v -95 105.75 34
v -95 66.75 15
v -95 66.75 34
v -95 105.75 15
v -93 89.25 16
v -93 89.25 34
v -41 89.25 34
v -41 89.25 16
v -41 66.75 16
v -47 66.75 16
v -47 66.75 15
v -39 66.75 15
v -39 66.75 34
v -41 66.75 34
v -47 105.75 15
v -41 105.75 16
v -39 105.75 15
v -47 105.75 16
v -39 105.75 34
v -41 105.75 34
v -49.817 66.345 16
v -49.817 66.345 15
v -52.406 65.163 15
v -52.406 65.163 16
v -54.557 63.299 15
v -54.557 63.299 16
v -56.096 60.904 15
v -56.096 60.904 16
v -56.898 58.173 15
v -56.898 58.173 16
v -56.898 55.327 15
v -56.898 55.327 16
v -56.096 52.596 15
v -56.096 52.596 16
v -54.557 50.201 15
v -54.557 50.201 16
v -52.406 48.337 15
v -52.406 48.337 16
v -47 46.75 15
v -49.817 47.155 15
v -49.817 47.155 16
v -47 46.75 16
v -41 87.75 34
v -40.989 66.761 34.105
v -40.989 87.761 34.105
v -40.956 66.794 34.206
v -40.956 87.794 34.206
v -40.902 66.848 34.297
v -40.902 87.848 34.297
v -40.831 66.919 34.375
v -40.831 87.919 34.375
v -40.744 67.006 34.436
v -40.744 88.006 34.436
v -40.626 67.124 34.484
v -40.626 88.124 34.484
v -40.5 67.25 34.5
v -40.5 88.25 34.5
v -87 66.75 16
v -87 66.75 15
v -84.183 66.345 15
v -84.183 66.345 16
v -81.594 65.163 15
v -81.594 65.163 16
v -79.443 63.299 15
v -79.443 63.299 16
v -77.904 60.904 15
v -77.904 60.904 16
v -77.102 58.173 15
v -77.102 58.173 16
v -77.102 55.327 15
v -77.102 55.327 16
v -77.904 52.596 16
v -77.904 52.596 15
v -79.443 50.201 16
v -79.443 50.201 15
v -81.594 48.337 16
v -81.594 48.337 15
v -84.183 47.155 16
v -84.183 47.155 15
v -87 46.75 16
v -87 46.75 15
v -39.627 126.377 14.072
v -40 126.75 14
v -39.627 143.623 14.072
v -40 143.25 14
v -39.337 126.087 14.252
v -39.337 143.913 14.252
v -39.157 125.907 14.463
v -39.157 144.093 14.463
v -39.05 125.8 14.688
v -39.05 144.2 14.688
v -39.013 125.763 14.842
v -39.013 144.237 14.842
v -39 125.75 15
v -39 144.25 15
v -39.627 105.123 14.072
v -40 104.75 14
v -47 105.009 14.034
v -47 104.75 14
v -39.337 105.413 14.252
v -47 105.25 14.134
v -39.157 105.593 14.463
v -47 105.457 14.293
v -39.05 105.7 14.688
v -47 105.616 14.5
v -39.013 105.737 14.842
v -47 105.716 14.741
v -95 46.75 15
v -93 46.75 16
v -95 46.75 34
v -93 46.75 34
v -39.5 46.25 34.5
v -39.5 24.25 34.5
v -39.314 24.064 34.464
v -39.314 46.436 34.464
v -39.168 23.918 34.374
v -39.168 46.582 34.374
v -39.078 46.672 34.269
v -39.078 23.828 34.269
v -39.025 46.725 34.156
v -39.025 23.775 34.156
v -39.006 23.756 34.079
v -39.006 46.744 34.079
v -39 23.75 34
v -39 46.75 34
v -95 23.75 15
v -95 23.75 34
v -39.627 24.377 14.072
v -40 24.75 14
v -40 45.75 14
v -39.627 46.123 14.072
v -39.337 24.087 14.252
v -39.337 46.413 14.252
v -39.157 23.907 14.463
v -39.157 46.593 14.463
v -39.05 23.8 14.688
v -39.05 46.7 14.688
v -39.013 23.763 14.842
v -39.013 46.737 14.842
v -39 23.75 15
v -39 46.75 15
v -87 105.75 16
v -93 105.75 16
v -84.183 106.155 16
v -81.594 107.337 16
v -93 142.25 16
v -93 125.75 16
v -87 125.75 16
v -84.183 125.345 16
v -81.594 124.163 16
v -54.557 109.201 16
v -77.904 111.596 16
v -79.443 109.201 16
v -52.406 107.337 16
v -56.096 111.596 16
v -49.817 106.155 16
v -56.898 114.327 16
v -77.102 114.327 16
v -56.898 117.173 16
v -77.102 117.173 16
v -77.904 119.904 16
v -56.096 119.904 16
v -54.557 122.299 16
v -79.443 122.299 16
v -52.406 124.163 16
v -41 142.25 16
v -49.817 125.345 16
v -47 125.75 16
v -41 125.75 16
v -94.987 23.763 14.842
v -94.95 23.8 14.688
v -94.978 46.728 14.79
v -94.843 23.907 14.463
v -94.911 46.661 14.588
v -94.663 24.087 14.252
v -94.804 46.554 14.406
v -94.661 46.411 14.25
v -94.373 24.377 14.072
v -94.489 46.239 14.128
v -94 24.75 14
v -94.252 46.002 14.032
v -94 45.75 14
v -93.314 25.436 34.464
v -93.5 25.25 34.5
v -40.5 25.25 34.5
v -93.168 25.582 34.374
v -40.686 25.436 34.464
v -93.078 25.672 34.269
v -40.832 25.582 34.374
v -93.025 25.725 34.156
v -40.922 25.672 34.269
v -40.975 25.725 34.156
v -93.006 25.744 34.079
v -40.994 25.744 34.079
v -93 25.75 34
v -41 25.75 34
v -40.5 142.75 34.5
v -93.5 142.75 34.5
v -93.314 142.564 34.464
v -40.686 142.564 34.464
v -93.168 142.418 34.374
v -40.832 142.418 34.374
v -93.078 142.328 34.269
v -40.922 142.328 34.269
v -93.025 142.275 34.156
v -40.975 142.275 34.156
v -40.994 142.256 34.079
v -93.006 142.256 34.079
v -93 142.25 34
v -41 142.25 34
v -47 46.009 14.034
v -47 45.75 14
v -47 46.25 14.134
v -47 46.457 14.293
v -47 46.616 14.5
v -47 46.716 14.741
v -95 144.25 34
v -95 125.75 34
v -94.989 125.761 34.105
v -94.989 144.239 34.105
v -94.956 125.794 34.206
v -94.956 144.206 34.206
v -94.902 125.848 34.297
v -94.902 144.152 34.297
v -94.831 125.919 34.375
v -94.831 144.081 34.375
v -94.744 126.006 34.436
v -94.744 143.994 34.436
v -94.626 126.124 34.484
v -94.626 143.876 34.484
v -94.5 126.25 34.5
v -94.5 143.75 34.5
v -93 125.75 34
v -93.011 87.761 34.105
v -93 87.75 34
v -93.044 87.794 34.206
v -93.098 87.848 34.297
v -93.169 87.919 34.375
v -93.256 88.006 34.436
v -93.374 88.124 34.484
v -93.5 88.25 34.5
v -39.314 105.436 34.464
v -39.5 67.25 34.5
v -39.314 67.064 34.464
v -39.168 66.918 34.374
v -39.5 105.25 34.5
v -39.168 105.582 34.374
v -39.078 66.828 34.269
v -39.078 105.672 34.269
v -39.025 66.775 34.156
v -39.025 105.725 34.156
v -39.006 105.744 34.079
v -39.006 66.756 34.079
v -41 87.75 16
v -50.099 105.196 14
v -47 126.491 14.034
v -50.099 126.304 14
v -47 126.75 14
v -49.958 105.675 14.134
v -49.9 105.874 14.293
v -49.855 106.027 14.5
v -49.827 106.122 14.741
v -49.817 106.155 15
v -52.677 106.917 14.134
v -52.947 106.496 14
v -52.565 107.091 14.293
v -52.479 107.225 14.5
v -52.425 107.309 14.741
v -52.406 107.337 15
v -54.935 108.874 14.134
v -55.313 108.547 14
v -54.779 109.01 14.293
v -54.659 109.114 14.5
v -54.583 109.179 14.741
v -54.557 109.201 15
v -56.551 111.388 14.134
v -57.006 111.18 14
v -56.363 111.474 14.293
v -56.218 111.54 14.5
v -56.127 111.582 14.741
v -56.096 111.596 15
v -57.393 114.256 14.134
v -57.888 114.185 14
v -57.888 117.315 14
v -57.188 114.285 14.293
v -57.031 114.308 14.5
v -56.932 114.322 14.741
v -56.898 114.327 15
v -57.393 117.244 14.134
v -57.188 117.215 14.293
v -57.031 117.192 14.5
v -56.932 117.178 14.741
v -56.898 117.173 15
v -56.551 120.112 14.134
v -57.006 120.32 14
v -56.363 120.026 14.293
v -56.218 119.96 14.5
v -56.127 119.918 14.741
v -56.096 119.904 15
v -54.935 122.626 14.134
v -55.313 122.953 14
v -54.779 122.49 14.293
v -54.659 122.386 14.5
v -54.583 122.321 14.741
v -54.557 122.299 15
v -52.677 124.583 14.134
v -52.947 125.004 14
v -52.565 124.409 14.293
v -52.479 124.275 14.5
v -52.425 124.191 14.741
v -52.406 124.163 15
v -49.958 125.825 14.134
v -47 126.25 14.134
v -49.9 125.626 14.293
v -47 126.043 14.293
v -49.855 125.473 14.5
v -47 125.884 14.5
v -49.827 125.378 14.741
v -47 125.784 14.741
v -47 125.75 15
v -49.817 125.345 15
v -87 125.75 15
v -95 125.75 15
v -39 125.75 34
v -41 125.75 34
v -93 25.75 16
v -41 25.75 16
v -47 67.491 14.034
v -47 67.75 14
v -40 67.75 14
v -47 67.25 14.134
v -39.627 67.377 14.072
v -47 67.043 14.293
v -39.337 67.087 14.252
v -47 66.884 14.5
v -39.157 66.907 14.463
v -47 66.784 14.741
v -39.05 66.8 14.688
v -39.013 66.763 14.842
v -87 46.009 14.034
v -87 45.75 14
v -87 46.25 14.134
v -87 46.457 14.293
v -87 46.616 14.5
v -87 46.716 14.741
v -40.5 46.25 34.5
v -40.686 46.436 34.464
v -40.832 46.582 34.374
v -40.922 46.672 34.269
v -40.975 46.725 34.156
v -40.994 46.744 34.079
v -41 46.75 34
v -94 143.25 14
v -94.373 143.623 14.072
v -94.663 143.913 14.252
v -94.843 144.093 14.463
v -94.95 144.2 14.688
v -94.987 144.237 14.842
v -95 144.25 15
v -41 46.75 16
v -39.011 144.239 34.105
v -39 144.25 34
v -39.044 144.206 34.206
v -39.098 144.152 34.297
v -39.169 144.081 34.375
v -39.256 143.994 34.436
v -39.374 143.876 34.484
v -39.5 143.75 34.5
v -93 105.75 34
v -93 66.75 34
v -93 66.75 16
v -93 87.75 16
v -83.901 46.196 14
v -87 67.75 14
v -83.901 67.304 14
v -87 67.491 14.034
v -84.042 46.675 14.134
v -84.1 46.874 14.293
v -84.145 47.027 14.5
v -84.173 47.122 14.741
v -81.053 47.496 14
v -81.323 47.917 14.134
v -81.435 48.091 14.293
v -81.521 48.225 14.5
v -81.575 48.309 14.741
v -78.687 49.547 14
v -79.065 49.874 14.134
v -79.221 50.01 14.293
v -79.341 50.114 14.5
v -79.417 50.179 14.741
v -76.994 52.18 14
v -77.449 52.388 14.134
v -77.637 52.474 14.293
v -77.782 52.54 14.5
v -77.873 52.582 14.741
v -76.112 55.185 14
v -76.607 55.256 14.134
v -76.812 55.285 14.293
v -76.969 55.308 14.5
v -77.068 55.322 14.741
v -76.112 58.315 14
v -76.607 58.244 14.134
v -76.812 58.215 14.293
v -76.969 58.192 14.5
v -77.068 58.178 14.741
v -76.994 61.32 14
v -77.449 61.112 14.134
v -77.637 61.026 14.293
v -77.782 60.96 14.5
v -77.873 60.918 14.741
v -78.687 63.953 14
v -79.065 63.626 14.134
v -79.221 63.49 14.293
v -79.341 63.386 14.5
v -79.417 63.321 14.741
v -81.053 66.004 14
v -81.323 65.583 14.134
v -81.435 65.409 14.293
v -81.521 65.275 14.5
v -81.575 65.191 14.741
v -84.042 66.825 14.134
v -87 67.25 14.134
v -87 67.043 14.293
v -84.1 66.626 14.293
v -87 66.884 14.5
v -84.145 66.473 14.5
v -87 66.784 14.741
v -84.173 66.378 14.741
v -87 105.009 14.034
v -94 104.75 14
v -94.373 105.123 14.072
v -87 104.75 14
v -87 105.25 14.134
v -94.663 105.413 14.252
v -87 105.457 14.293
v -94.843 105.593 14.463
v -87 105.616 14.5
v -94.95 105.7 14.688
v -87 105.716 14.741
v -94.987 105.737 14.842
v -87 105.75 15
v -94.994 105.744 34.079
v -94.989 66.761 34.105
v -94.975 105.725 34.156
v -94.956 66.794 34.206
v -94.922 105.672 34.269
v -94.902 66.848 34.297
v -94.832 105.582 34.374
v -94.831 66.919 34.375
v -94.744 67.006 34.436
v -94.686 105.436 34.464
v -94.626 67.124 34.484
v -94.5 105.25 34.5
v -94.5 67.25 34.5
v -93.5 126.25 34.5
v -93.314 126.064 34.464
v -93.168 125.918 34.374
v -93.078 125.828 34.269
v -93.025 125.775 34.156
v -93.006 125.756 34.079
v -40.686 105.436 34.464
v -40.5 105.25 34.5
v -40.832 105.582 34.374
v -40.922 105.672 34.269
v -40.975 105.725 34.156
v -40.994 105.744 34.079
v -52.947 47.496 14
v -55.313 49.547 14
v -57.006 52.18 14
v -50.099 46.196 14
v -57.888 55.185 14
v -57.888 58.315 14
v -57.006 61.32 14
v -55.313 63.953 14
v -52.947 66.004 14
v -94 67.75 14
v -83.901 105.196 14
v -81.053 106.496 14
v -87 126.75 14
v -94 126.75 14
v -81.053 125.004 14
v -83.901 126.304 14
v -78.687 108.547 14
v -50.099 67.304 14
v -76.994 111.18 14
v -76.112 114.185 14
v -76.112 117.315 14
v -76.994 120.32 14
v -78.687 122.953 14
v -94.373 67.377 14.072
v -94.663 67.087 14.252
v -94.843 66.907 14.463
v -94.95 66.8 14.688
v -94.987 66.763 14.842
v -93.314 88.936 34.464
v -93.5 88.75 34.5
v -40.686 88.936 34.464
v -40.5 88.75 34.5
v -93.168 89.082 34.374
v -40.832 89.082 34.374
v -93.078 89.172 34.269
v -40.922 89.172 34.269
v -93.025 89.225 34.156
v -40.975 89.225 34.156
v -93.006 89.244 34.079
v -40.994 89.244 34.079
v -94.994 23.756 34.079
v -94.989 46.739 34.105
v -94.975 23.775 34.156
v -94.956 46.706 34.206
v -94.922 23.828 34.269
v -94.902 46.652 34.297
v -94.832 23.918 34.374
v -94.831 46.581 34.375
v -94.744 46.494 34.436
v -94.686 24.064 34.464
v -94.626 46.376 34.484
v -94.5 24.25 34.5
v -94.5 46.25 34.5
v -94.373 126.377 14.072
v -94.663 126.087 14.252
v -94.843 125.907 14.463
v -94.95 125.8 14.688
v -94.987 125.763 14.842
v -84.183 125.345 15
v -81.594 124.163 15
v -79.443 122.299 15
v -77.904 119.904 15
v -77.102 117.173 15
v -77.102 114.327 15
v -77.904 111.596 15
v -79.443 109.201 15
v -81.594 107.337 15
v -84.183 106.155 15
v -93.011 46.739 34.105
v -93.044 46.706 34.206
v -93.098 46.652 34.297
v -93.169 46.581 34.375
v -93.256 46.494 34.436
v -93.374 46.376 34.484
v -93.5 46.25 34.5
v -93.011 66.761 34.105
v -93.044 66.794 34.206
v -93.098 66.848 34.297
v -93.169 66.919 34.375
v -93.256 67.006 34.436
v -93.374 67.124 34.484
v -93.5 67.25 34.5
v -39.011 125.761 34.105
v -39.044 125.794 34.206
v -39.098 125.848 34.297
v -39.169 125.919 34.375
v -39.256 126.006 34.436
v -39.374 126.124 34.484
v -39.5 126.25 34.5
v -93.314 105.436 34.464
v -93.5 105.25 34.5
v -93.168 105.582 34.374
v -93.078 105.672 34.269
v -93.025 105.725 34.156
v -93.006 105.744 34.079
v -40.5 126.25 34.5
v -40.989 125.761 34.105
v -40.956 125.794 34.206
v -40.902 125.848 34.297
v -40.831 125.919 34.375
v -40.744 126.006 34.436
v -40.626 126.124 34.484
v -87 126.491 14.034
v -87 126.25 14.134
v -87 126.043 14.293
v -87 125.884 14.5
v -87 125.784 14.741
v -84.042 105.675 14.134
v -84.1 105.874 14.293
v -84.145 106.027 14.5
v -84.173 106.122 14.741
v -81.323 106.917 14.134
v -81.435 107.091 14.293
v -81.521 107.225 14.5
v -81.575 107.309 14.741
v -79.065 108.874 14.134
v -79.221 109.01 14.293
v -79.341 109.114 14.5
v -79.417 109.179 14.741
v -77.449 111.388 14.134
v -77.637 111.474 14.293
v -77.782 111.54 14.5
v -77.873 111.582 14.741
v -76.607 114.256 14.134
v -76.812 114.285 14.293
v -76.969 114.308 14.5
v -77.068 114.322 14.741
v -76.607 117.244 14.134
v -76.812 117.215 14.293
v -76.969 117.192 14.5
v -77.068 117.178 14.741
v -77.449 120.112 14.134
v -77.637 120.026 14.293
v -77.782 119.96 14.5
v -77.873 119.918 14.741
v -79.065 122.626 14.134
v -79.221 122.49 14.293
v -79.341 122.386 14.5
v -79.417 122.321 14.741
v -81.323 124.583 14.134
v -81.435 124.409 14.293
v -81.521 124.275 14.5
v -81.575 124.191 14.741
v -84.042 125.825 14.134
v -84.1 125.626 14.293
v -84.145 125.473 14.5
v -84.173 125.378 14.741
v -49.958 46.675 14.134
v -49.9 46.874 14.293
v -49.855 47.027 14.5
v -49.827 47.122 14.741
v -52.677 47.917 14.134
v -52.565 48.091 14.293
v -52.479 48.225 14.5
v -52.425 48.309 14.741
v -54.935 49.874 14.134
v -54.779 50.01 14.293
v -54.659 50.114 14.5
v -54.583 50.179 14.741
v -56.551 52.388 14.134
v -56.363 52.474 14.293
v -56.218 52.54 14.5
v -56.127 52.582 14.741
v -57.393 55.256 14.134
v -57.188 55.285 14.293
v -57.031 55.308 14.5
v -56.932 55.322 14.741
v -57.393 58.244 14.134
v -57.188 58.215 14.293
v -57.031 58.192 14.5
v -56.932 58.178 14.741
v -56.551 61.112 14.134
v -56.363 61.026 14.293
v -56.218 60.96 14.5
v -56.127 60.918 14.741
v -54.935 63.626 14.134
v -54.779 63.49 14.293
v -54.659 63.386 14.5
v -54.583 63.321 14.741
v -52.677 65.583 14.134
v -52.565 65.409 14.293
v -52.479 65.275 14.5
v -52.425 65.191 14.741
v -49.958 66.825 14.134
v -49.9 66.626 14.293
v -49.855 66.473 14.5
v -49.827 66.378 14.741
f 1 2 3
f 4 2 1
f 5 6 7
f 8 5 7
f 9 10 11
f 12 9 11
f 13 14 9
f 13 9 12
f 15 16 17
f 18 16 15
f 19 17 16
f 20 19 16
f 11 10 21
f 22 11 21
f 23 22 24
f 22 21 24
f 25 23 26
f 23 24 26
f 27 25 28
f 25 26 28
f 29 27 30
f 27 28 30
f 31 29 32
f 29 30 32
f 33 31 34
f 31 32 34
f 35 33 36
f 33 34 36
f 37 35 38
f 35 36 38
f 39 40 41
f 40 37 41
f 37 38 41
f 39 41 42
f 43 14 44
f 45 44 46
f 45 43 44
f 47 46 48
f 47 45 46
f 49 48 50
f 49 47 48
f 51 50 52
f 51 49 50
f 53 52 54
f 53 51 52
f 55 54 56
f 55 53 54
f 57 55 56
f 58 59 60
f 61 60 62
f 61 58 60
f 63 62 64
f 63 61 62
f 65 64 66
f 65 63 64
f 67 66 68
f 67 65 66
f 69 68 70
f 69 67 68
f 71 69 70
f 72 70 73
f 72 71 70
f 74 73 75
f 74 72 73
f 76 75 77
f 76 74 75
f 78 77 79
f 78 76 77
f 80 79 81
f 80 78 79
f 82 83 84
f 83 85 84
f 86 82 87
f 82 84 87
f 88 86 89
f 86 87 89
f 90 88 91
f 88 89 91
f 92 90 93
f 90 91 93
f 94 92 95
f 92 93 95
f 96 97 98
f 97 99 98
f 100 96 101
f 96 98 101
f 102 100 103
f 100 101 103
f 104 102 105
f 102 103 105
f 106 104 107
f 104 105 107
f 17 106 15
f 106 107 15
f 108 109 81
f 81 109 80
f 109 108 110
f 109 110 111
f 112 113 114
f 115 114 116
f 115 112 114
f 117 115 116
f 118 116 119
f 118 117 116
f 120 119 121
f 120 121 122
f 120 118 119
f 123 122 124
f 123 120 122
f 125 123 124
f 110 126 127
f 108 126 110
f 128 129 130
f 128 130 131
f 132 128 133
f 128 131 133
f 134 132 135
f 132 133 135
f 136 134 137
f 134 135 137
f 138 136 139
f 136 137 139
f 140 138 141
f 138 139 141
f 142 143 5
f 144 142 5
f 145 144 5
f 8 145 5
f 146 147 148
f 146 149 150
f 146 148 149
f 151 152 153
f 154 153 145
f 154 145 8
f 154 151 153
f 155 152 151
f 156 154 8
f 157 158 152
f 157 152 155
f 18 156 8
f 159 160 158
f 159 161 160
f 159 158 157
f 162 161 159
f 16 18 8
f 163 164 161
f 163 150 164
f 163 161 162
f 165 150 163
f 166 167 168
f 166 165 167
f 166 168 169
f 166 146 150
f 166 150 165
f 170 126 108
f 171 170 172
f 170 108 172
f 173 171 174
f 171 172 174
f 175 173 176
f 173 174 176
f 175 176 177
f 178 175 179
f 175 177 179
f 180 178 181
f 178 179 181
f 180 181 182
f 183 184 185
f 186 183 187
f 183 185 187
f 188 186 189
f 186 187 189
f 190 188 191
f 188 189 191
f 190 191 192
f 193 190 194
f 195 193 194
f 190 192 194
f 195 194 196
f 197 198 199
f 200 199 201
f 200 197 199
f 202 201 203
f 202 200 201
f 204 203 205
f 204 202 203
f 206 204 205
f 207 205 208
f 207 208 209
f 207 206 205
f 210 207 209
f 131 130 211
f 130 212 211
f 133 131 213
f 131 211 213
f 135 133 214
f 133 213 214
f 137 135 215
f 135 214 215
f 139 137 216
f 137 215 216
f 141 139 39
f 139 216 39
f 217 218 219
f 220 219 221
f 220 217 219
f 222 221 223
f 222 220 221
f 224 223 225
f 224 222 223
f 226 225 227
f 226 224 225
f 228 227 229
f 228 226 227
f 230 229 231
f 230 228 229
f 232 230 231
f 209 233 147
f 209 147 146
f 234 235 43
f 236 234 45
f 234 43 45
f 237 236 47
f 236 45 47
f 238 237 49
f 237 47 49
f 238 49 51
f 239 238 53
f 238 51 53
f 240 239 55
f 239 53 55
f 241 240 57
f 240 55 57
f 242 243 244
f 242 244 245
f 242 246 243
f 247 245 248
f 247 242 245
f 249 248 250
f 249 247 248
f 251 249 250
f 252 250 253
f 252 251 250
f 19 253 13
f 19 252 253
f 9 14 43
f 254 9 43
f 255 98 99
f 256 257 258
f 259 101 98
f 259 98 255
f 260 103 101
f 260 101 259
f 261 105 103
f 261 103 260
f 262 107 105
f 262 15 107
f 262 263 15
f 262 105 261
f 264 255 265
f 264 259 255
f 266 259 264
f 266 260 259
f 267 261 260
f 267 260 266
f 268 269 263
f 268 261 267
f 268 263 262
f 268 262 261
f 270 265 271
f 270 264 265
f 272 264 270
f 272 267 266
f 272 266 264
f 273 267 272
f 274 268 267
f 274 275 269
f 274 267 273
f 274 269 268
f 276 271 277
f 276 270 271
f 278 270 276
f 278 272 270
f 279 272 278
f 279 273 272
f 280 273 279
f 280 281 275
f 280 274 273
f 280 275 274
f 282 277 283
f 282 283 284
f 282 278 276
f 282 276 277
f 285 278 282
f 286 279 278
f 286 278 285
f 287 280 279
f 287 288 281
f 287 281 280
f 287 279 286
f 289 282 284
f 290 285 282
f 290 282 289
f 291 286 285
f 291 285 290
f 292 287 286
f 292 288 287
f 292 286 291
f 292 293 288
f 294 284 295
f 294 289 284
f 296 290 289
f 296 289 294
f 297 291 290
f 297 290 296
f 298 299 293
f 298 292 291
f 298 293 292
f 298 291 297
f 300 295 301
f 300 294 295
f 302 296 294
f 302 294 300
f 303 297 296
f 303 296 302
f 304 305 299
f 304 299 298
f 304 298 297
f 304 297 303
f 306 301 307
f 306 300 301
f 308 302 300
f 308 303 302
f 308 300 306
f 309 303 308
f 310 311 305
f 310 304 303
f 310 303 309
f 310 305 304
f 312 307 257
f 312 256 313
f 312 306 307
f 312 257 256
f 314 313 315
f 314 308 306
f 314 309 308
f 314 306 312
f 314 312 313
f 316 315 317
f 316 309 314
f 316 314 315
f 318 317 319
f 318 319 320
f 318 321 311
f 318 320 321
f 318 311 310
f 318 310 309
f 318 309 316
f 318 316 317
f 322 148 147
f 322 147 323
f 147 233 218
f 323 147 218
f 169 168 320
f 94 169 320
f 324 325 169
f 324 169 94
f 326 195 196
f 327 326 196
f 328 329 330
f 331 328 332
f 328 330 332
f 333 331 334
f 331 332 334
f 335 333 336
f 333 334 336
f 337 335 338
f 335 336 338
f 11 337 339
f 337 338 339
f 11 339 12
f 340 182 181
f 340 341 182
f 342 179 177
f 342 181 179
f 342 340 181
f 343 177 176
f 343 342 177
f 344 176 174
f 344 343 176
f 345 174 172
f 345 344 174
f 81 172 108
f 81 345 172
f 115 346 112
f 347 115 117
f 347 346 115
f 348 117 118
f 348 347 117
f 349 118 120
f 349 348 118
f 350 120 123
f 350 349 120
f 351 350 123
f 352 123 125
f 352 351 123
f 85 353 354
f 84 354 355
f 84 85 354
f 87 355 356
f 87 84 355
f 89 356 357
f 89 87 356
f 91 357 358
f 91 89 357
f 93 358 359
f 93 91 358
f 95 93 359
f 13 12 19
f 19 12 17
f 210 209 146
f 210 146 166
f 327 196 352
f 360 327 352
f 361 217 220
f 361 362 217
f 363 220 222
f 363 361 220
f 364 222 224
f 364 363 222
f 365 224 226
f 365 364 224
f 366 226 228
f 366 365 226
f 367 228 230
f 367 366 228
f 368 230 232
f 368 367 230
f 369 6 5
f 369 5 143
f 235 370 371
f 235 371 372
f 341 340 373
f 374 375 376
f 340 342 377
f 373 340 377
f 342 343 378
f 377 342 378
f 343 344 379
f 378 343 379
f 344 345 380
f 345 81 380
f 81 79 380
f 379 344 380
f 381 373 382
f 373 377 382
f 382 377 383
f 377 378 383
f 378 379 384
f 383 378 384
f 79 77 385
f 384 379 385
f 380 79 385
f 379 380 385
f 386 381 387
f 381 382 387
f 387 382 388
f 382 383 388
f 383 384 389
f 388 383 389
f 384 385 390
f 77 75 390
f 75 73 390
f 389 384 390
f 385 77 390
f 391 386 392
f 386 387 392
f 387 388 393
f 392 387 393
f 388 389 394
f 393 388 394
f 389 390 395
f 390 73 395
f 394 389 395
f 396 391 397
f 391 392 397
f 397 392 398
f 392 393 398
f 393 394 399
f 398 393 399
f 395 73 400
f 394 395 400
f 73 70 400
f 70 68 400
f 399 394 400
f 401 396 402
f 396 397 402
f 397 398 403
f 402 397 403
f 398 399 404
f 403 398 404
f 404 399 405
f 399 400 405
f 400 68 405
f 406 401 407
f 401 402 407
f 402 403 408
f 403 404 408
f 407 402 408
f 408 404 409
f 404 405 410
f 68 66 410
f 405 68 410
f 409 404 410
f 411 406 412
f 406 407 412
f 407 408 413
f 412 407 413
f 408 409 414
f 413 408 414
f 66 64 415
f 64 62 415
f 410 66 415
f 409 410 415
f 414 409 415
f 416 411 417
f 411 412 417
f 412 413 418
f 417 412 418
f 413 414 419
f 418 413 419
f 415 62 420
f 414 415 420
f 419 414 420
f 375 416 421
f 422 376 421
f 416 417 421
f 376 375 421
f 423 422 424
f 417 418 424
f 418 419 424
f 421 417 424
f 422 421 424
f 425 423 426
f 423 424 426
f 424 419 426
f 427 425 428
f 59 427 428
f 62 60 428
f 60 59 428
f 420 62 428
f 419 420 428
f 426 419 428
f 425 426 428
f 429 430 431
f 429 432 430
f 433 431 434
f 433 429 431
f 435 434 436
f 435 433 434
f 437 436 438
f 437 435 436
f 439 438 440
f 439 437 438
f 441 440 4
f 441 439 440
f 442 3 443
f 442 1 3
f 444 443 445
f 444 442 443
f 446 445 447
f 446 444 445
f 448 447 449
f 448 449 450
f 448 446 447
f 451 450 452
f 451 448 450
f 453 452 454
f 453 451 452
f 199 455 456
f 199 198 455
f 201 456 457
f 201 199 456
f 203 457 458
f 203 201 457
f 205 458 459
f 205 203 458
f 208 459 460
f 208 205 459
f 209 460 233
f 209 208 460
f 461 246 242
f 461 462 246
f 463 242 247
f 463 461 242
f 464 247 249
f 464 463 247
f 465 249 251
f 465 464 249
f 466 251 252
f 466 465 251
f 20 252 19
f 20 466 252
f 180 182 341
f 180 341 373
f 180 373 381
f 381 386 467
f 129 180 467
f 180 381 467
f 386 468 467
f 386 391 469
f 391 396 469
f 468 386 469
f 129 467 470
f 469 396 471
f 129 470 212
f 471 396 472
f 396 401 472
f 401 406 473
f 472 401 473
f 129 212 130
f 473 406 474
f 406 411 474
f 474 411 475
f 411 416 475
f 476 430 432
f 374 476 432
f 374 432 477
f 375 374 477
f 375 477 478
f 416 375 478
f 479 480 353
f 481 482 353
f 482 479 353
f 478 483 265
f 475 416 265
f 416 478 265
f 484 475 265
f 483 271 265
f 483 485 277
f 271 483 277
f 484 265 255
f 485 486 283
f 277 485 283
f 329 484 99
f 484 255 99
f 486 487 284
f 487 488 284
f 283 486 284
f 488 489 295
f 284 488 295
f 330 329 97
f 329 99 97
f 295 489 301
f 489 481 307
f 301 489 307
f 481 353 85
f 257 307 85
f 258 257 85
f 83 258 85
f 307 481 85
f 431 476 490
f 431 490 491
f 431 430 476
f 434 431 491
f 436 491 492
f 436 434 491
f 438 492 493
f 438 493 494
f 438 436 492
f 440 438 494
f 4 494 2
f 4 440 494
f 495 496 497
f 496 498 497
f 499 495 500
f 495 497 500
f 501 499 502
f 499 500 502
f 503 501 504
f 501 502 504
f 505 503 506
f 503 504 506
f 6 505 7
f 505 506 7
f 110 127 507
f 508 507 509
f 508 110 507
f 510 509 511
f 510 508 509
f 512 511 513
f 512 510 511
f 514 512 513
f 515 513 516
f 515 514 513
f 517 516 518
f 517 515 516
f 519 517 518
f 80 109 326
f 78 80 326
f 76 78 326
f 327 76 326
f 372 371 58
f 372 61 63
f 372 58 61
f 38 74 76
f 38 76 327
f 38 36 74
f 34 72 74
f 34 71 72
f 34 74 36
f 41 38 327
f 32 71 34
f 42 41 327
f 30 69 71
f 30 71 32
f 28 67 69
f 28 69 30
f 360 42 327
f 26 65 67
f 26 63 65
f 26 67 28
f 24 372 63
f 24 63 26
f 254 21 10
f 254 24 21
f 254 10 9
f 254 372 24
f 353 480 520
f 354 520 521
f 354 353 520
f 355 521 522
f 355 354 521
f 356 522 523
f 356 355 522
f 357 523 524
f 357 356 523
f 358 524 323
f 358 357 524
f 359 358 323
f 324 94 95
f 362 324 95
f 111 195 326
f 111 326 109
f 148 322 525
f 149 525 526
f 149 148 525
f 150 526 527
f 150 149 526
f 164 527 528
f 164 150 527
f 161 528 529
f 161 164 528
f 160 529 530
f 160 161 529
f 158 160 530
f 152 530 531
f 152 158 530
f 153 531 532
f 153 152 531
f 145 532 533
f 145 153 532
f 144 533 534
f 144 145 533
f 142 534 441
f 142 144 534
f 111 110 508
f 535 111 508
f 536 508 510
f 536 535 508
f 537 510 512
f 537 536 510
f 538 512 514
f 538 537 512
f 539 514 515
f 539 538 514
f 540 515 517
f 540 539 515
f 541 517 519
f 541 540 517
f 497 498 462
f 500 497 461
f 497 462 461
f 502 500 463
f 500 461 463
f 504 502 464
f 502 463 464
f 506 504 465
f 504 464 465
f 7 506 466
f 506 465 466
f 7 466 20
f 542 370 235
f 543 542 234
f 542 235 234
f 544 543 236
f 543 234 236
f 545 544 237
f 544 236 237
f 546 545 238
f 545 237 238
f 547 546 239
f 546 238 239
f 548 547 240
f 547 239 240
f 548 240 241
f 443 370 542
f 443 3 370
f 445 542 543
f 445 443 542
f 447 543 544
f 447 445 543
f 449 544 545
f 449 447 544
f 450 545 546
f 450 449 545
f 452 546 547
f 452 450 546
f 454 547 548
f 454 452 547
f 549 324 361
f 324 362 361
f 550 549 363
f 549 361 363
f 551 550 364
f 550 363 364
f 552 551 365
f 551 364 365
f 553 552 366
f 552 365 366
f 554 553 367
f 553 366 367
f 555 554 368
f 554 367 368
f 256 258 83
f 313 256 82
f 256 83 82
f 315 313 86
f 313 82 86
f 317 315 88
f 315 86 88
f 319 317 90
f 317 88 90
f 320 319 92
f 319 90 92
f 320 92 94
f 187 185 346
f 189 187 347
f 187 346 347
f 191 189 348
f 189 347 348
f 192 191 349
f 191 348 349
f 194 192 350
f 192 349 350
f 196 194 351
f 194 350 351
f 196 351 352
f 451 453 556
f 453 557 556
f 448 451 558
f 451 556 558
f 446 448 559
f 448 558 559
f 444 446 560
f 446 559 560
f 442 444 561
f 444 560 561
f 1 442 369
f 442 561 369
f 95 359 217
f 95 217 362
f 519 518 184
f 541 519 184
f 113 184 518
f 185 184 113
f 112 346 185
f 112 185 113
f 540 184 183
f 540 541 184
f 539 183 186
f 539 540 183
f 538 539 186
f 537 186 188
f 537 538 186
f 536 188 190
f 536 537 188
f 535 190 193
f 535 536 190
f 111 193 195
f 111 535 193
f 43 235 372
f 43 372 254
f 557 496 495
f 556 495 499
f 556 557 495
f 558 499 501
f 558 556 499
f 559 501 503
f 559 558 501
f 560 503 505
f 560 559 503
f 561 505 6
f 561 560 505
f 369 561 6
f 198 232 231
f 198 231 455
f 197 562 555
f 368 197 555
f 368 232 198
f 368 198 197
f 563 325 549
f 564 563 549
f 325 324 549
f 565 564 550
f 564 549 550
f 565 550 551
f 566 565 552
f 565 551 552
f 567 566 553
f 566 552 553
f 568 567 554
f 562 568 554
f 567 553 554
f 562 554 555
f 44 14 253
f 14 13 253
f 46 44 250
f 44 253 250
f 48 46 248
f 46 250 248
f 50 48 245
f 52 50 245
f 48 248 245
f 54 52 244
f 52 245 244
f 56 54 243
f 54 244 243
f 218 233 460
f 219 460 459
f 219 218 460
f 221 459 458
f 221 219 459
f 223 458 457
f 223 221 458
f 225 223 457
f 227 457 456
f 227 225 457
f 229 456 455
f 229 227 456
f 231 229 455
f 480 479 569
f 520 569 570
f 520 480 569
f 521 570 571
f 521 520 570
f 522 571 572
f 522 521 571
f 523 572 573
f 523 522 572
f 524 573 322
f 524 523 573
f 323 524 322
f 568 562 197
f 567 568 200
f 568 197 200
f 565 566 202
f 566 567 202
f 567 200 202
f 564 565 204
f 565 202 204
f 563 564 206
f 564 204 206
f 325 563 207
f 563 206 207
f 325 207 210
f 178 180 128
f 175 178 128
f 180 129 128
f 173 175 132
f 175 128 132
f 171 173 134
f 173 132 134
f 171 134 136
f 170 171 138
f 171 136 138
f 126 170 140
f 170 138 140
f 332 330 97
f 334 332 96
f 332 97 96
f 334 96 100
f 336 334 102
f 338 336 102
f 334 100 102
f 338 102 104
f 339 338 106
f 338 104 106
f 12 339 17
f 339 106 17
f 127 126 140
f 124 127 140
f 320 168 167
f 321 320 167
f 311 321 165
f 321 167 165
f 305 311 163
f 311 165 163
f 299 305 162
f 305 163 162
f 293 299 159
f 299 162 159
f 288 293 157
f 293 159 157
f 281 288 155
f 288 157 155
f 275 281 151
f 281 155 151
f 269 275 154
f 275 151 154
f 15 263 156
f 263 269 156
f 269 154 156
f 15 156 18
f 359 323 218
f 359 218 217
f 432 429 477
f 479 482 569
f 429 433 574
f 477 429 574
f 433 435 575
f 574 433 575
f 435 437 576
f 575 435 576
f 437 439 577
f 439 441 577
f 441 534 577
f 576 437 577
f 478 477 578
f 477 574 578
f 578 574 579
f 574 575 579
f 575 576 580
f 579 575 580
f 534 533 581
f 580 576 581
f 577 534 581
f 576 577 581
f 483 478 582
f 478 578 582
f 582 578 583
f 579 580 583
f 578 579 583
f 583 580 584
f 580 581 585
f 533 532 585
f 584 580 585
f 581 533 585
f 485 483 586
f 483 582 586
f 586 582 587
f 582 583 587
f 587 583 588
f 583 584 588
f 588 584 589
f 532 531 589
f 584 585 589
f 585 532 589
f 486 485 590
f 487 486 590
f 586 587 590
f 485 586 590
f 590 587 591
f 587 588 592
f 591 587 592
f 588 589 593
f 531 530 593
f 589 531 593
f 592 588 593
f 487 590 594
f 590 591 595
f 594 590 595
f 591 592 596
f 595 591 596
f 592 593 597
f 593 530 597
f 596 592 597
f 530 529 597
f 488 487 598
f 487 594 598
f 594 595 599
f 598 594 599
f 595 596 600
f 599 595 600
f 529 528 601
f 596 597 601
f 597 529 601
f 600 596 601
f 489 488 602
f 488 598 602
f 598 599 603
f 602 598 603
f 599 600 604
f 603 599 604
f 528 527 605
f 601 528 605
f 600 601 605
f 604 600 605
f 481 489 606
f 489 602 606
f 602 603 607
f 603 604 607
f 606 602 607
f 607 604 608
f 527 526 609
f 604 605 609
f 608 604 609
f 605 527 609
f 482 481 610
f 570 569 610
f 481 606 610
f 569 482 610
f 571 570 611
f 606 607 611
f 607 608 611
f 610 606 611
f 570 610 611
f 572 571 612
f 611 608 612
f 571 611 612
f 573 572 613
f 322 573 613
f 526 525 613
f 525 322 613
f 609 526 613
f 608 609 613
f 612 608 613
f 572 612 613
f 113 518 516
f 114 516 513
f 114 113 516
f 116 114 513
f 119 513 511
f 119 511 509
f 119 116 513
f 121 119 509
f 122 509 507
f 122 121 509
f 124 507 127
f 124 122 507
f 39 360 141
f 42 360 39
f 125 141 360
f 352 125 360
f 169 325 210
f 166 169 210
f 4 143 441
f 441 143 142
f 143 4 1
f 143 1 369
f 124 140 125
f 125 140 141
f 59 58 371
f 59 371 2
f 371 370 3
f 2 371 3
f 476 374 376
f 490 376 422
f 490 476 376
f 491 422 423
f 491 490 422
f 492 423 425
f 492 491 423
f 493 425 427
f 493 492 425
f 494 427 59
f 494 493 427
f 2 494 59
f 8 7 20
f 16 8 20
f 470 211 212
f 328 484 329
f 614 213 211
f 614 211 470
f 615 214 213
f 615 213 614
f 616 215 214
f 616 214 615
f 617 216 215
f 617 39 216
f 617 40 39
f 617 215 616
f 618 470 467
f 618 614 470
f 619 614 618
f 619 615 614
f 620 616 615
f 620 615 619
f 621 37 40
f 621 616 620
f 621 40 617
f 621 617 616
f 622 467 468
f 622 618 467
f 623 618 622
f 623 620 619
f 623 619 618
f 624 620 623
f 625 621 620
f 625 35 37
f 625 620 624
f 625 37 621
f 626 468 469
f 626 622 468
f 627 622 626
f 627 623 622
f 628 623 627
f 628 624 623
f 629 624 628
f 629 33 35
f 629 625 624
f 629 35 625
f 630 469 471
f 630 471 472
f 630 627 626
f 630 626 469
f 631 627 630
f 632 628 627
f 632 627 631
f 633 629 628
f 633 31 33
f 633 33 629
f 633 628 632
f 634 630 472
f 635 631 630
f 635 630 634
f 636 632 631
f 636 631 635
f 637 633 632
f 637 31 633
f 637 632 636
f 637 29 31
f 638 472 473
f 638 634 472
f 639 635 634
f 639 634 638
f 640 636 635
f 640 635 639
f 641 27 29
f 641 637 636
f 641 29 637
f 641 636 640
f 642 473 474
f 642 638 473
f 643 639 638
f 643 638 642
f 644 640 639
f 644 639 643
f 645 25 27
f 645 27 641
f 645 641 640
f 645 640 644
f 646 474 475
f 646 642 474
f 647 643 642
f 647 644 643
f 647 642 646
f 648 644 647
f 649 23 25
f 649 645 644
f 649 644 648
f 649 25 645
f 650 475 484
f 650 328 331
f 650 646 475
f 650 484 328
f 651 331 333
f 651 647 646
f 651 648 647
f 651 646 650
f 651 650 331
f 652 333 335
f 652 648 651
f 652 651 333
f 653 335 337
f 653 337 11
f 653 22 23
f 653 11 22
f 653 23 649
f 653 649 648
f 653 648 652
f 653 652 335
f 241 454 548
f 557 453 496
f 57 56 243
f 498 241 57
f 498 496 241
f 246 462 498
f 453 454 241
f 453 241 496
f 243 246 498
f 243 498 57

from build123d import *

# Parameters (mm, degrees)
SKETCH009_W     = 56
SKETCH009_H     = 120.5
PAD004_DEPTH    = 20.5
SKETCH010_W     = 52
SKETCH010_H     = 53
SKETCH010_H_2   = 62
POCKET005_DEPTH = 18.5
POCKET006_DEPTH = 289.39875
FILLET005_R     = 1
FILLET006_R     = 0.5


with BuildPart() as part:
    # Sketch009 → Pad004 (new body)
    with BuildSketch(Plane.XY):
        Rectangle(SKETCH009_W, SKETCH009_H)
    extrude(amount=PAD004_DEPTH)

    # Sketch010 (on DatumPlane) → Pocket005 (cut)
    with BuildSketch(Plane(origin=(0, 4.5, 20.5), x_dir=(1, 0, 0), z_dir=(0, 0, 1))):
        with Locations((0, 27.25)):
            Rectangle(SKETCH010_W, SKETCH010_H)
        with Locations((0, -31.75)):
            Rectangle(SKETCH010_W, SKETCH010_H_2)
    extrude(amount=-POCKET005_DEPTH, mode=Mode.SUBTRACT)

    # Sketch011 (on DatumPlane) → Pocket006 (cut, through all)
    with BuildSketch(Plane(origin=(20, 0, 20.5), x_dir=(1, 0, 0), z_dir=(0, 0, 1))):
        with BuildLine():
            Line((0, 41.75), (30, 41.75))
            Line((30, 41.75), (30, 21.75))
            Line((30, 21.75), (0, 21.75))
            ThreePointArc((0, 41.75), (-10, 31.75), (0, 21.75))
        make_face()
        with BuildLine():
            Line((0, -17.25), (30, -17.25))
            Line((30, -17.25), (30, -37.25))
            Line((30, -37.25), (0, -37.25))
            ThreePointArc((0, -17.25), (-10, -27.25), (0, -37.25))
        make_face()
    pocket006 = extrude(amount=-POCKET006_DEPTH, mode=Mode.SUBTRACT)

    # Mirrored003: Pocket006 across YZ
    add(pocket006.mirror(Plane.YZ), mode=Mode.SUBTRACT)

    # Fillet005
    fillet005_edges = [part.edges().sort_by_distance(p)[0] for p in [
        (0, 60.25, 0),
        (28, 51, 0),
        (24, 41.75, 0),
        (10, 31.75, 0),
        (24, 21.75, 0),
        (28, 2.25, 0),
        (24, -17.25, 0),
        (10, -27.25, 0),
        (24, -37.25, 0),
        (28, -48.75, 0),
        (0, -60.25, 0),
        (-28, -48.75, 0),
        (-24, -37.25, 0),
        (-10, -27.25, 0),
        (-24, -17.25, 0),
        (-28, 2.25, 0),
        (-24, 21.75, 0),
        (-10, 31.75, 0),
        (-24, 41.75, 0),
        (-28, 51, 0),
    ]]
    fillet(fillet005_edges, radius=FILLET005_R)

    # Fillet006
    fillet006_edges = [part.edges().sort_by_distance(p)[0] for p in [
        (0, 60.25, 20.5),
        (28, 51, 20.5),
        (27, 41.75, 20.5),
        (26, 50, 20.5),
        (0, 58.25, 20.5),
        (-26, 50, 20.5),
        (-27, 41.75, 20.5),
        (-28, 51, 20.5),
        (-27, 21.75, 20.5),
        (-26, 13.5, 20.5),
        (0, 5.25, 20.5),
        (26, 13.5, 20.5),
        (27, 21.75, 20.5),
        (28, 2.25, 20.5),
        (27, -17.25, 20.5),
        (26, -6.75, 20.5),
        (0, 3.75, 20.5),
        (-26, -6.75, 20.5),
        (-27, -17.25, 20.5),
        (-28, 2.25, 20.5),
        (-27, -37.25, 20.5),
        (-26, -47.75, 20.5),
        (0, -58.25, 20.5),
        (26, -47.75, 20.5),
        (27, -37.25, 20.5),
        (28, -48.75, 20.5),
        (0, -60.25, 20.5),
        (-28, -48.75, 20.5),
    ]]
    fillet(fillet006_edges, radius=FILLET006_R)


with BuildPart() as part_1:
    # Body003 placement: moved
    add(part.part.moved(Location((-67, 84, 14))))


solid = part_1.part
